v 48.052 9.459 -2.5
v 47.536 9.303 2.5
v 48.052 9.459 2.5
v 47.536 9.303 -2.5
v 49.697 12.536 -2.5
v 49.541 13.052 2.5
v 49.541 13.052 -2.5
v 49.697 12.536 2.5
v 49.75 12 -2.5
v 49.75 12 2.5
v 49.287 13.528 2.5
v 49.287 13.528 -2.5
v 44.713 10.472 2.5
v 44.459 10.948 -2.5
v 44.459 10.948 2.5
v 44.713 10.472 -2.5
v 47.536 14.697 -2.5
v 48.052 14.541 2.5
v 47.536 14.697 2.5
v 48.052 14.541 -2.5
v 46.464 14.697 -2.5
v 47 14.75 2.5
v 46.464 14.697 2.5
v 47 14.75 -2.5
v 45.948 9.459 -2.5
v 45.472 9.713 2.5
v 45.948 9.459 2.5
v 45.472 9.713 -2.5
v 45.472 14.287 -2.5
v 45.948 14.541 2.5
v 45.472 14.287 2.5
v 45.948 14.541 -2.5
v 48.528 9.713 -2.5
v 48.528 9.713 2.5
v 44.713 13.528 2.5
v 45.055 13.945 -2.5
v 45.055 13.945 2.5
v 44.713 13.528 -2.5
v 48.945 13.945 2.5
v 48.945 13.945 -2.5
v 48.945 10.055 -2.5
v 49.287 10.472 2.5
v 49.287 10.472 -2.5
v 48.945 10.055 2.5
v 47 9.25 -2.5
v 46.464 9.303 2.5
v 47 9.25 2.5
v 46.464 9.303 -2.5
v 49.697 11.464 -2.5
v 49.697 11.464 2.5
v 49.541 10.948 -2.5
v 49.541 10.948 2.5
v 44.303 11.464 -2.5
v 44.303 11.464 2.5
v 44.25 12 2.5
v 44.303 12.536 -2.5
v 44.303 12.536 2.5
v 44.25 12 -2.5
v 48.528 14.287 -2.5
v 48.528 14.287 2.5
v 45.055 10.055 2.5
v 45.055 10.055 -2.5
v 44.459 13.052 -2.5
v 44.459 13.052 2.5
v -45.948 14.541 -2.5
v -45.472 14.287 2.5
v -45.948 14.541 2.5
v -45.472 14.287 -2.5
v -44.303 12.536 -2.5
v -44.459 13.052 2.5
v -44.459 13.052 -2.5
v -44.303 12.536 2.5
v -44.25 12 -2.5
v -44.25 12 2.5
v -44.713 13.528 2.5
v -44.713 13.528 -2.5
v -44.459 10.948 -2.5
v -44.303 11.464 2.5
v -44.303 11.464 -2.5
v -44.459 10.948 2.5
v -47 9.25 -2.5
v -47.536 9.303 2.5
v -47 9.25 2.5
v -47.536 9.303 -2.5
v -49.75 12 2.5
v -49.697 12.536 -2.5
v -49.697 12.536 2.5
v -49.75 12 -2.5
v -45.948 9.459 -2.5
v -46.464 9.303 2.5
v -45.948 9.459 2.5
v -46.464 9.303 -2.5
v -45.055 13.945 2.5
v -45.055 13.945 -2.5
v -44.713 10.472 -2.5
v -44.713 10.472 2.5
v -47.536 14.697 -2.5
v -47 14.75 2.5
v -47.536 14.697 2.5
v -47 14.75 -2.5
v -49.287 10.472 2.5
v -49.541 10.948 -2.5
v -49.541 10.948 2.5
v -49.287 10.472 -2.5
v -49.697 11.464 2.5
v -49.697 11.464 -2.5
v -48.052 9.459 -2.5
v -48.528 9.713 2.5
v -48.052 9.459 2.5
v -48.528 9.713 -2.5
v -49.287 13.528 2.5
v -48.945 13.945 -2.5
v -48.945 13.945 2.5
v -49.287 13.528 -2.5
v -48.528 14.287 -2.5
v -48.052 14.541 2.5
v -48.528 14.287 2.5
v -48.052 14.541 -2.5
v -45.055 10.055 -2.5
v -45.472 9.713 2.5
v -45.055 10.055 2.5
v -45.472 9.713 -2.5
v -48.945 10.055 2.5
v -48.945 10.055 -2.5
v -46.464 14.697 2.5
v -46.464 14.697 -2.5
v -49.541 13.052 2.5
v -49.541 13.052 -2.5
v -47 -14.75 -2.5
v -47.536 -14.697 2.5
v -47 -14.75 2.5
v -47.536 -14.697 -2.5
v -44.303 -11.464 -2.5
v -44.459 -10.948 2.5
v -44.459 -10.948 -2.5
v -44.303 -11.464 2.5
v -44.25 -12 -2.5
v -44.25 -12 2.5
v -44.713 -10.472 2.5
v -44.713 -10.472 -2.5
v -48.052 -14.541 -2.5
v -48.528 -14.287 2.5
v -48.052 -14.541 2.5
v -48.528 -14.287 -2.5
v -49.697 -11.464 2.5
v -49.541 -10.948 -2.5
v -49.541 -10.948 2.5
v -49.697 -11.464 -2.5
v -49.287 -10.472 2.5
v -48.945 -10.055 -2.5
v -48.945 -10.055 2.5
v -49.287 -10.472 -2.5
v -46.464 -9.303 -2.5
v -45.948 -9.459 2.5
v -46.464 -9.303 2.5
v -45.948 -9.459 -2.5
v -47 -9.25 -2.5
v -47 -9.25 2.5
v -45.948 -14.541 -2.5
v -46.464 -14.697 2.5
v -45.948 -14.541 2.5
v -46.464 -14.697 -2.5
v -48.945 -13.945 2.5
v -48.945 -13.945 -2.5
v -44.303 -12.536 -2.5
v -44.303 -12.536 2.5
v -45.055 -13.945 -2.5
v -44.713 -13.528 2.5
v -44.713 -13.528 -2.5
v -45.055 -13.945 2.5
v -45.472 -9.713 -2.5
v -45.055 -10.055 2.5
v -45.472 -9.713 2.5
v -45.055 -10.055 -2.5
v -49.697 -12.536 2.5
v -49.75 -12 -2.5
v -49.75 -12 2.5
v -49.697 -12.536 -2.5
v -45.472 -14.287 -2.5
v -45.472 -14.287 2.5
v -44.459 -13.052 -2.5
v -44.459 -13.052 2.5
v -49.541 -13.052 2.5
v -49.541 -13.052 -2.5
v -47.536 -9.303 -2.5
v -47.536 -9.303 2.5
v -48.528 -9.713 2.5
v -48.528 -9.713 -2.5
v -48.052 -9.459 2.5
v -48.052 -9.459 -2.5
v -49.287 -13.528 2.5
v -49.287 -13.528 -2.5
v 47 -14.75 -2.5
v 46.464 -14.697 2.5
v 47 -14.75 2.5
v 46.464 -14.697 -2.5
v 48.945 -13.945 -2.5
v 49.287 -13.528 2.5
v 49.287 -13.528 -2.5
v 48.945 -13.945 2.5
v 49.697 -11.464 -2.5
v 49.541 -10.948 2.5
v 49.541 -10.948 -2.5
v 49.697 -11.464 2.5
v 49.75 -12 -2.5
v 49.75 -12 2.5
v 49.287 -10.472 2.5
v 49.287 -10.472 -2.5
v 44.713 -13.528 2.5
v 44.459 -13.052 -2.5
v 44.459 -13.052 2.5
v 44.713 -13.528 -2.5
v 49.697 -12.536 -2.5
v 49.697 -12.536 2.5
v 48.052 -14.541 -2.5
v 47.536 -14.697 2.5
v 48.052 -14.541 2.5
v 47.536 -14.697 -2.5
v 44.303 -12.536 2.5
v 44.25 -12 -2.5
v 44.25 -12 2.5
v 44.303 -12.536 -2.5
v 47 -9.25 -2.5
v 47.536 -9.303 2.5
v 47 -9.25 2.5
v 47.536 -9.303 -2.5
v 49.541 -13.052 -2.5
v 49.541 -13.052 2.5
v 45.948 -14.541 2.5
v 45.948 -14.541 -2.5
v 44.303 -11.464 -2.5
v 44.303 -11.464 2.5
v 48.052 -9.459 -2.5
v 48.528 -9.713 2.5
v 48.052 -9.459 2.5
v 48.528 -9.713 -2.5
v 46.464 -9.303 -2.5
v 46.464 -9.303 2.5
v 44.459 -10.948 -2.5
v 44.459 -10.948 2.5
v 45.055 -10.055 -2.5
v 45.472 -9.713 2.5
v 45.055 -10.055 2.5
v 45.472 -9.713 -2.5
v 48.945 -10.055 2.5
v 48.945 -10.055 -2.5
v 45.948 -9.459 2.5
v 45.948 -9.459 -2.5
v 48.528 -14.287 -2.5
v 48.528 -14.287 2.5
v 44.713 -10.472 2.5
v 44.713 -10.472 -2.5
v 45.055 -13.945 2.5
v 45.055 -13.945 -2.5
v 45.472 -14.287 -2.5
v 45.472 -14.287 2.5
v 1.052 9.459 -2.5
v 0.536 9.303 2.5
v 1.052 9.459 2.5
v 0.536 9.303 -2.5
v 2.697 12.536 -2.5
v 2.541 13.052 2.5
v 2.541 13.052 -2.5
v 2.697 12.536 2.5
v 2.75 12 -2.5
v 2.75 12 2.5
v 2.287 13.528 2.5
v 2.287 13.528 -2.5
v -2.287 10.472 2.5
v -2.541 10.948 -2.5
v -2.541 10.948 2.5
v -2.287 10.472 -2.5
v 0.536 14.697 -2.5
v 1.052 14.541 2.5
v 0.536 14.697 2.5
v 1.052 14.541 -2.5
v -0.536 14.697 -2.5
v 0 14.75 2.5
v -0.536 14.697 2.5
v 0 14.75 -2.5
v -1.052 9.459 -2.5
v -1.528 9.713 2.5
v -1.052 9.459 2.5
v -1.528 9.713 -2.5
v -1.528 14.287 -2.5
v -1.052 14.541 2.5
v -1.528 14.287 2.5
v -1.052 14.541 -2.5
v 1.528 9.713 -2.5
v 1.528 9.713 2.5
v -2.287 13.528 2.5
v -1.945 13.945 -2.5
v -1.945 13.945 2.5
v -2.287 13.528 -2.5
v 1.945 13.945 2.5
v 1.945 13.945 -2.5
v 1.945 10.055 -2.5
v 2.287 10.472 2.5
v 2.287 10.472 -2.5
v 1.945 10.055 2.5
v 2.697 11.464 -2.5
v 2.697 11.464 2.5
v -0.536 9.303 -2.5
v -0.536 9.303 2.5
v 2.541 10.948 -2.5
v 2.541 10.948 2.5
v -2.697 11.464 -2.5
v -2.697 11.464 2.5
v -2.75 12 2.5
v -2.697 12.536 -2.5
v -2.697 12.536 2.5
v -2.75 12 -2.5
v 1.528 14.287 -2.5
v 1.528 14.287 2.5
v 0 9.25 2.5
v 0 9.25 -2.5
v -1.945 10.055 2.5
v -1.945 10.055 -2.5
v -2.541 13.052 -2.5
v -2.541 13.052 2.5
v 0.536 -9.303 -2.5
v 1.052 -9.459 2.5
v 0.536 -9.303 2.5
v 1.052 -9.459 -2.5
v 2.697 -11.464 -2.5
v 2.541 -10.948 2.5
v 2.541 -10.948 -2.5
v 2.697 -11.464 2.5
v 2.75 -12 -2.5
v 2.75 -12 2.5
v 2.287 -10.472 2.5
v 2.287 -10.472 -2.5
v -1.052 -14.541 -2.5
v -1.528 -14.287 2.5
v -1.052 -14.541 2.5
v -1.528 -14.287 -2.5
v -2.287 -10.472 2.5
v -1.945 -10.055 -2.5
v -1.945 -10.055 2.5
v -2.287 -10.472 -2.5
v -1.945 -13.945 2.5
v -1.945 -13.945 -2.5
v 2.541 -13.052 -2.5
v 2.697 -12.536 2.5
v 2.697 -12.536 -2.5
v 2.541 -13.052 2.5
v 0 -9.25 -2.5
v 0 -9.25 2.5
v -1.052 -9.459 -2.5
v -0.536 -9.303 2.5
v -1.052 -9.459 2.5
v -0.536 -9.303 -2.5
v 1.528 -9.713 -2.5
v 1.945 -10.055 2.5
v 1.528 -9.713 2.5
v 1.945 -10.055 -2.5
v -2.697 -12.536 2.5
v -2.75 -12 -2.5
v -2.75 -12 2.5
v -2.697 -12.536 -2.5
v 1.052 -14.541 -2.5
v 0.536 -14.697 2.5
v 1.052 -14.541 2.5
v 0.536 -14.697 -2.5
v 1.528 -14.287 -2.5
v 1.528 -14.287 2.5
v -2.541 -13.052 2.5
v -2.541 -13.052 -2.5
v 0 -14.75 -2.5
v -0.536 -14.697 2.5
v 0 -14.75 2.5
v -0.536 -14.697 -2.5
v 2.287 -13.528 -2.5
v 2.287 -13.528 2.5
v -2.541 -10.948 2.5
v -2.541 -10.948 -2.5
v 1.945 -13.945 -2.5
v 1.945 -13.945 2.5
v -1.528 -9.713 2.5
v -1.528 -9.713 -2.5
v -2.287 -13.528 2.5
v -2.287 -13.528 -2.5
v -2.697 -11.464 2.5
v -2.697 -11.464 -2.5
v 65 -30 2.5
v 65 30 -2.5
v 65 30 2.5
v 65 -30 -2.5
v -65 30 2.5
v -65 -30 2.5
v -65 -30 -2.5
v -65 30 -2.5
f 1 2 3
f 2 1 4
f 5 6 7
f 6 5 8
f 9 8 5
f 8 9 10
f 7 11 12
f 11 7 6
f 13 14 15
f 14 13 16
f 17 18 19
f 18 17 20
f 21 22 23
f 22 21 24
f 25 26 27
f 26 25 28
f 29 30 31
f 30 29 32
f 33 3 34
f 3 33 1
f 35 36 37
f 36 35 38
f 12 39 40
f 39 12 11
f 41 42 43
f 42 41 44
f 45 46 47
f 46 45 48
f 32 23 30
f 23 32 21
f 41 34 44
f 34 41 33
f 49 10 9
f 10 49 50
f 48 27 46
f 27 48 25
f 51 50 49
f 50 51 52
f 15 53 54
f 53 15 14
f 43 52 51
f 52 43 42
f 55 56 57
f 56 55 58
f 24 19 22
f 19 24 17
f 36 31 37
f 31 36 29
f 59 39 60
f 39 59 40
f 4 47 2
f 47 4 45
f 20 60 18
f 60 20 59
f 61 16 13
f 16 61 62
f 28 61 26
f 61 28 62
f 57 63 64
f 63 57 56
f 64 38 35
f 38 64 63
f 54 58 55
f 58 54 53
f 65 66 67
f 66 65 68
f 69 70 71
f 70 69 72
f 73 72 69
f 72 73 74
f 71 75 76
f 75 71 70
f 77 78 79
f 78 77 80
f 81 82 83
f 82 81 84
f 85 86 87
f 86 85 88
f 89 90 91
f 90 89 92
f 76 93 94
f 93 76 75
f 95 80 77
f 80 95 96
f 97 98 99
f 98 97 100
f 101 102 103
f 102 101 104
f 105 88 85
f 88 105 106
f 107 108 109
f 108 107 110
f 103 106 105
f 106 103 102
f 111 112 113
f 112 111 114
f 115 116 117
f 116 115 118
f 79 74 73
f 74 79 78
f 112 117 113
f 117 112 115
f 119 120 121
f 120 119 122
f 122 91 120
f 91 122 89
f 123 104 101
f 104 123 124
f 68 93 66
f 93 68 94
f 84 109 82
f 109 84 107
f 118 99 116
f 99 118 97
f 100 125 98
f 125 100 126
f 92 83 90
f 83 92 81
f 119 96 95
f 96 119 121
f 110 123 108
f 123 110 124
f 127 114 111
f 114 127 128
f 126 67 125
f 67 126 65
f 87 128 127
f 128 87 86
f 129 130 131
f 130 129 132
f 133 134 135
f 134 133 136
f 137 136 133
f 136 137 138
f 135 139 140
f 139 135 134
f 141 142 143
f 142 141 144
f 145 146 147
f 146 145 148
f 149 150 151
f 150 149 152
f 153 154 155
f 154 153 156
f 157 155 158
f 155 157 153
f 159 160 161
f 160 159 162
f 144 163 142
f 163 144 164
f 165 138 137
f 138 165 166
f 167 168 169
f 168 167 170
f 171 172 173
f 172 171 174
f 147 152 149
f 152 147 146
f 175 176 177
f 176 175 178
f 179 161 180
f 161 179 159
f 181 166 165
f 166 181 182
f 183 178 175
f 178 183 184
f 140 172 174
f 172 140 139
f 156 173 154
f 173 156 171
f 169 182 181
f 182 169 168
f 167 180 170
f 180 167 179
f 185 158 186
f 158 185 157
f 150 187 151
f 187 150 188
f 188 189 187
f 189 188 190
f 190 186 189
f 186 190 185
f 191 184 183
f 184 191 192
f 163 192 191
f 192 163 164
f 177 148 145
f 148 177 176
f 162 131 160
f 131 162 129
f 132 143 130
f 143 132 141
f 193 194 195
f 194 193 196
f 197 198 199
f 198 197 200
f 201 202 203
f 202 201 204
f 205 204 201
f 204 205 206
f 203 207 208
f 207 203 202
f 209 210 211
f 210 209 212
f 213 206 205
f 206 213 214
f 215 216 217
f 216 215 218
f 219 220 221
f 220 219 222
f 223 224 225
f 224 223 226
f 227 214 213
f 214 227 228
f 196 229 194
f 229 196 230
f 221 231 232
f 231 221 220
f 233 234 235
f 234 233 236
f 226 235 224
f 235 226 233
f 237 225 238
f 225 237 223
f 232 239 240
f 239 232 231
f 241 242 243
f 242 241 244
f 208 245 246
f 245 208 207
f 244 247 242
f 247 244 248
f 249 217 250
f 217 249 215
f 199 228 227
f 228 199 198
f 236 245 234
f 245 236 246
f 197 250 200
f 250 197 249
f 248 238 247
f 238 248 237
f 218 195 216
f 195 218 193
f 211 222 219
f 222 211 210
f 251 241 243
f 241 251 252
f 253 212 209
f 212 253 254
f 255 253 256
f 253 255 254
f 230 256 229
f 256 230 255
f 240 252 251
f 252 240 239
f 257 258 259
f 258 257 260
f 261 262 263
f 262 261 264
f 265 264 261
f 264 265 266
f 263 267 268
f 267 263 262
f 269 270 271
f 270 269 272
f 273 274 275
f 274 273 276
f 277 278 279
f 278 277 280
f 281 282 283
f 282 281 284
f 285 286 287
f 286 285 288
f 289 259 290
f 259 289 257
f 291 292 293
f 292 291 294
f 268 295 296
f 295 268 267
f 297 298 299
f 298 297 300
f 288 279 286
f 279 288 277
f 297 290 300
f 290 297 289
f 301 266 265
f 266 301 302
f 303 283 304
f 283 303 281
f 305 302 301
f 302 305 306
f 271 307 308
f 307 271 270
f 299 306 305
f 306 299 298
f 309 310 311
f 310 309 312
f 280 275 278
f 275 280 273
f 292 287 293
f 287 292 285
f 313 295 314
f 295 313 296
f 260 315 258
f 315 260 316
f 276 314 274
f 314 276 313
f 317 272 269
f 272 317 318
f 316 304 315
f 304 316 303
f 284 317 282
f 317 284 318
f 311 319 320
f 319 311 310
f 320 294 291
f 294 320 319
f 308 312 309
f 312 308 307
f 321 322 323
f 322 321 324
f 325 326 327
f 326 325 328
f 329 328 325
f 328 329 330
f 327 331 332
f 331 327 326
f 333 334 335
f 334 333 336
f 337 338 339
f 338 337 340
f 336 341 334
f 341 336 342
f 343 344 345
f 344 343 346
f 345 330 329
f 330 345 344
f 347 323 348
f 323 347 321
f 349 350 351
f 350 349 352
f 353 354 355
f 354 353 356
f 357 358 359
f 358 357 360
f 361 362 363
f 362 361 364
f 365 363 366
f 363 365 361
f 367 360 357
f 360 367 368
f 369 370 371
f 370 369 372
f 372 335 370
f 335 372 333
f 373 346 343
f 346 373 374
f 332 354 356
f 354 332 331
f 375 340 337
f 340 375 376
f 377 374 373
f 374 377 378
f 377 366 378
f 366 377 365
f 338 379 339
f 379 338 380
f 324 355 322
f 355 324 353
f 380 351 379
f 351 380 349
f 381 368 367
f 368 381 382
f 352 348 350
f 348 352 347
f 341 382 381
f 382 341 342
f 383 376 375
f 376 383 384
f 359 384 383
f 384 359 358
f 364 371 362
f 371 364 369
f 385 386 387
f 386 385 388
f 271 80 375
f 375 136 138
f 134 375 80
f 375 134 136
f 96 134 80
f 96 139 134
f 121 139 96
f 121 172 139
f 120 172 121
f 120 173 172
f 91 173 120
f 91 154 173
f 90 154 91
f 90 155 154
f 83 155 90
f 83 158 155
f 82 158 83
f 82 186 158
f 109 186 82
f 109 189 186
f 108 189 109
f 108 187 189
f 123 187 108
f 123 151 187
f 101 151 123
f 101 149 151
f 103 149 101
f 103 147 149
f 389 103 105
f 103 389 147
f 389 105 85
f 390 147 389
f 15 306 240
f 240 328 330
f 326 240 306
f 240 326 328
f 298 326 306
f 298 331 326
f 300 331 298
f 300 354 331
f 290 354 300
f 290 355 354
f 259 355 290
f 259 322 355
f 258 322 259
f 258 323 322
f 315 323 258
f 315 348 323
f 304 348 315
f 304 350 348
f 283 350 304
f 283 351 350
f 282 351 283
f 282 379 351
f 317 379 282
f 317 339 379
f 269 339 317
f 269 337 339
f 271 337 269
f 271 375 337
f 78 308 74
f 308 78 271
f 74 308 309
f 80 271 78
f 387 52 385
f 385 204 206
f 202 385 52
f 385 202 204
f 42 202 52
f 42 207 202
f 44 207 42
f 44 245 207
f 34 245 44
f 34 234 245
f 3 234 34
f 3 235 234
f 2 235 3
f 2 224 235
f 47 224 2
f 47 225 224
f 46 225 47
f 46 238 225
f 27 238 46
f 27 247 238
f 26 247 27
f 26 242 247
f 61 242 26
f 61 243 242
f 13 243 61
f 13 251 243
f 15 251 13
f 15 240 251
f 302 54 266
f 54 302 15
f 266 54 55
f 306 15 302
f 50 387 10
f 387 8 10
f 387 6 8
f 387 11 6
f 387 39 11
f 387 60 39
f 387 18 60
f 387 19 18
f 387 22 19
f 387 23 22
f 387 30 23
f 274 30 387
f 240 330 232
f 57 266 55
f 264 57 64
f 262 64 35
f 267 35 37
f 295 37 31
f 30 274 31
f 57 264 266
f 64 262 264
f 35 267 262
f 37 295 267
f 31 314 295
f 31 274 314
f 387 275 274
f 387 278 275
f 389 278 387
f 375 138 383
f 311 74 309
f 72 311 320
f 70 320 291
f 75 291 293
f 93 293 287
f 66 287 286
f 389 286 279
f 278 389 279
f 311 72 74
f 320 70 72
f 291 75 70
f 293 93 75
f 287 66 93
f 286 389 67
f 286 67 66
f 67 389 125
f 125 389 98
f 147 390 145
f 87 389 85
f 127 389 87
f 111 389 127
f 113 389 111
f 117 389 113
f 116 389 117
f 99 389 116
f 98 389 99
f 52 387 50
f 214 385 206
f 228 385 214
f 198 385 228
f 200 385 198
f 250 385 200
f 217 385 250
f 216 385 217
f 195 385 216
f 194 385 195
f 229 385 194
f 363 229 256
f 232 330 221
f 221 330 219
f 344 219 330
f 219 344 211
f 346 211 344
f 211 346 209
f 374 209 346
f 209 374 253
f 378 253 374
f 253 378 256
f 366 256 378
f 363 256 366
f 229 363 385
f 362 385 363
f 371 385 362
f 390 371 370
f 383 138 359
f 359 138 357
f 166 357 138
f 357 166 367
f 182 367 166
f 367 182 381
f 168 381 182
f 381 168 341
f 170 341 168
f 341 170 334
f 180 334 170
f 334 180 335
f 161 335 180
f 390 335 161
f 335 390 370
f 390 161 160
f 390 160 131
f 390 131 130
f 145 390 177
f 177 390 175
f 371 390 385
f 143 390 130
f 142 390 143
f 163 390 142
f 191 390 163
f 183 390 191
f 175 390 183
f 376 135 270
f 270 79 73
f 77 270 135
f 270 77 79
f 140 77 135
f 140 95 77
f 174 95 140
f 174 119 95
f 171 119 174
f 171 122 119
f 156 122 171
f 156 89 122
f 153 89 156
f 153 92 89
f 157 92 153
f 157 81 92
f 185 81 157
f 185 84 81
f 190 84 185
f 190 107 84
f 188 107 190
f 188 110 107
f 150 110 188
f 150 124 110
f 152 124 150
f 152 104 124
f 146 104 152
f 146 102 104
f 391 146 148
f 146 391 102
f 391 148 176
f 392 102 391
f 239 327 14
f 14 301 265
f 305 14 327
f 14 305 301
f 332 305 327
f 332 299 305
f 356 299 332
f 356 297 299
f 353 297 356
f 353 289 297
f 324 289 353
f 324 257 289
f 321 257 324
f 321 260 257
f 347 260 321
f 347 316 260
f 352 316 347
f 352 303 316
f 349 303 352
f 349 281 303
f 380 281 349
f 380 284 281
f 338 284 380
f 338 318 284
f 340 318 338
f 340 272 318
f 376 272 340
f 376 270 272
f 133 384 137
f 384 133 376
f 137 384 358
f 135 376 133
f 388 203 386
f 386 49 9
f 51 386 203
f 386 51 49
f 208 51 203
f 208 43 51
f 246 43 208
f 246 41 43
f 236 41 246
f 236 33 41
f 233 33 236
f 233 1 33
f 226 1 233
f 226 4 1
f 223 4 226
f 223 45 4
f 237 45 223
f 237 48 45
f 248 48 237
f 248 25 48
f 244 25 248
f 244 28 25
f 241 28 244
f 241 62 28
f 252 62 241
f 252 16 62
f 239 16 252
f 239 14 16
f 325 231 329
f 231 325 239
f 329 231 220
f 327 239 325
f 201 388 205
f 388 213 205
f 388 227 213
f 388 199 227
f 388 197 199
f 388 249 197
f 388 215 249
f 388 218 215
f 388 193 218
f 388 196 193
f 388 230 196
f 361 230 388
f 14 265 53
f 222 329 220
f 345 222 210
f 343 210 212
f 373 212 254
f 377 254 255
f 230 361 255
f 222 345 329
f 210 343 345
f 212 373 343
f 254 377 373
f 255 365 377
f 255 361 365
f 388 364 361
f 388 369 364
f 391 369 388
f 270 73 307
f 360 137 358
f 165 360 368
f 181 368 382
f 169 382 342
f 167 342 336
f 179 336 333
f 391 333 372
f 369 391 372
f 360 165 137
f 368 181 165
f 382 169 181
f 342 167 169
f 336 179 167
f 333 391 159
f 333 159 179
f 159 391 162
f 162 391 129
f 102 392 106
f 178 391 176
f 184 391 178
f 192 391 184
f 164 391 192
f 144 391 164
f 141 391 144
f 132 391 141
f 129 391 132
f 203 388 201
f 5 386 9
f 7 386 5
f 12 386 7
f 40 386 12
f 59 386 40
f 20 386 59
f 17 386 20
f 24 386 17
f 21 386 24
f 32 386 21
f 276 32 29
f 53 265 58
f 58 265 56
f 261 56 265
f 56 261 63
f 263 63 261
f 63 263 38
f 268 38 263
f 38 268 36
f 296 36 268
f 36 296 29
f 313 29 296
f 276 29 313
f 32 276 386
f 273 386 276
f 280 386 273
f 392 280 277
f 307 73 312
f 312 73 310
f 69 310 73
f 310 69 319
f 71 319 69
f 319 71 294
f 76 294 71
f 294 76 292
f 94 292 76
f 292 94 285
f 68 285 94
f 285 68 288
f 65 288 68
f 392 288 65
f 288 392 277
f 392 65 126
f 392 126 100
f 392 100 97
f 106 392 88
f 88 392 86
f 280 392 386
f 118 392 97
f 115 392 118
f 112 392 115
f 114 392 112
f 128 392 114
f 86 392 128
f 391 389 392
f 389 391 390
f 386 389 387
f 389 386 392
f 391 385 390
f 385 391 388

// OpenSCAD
$fn = 32;

// ----------------------------------------------------------------------
// Corner plate 130 x 60 x 5
// 6 holes, centres taken from the edge offset
// ----------------------------------------------------------------------

// --- parameters (mm) ---
plate = [130, 60, 5];  // overall size (x, y, z)
seat_tol = 0.1;        // tolerance at the seating features
free_tol = 0.5;        // general tolerance on the free sizes
holes = 6;             // number of holes the drawing asks for
hole_d = 5.5;          // hole diameter
edge = 18;             // hole centre offset from the plate edge

// --- derived feature positions (mm) ---
corner_x = plate[0] / 2 - edge;  // = 47   corner hole X
corner_y = plate[1] / 2 - edge;  // = 12   corner hole Y
feature_centers = [
  [corner_x, corner_y],
  [-corner_x, corner_y],
  [-corner_x, -corner_y],
  [corner_x, -corner_y],
  [0, corner_y],
  [0, -corner_y]
];   // hole centres the loop below drills

// plate outline, every hole drilled through with the same cutters
difference() {
  cube(plate, center = true);
  for (centre = feature_centers)
    translate([centre[0], centre[1], 0])
      cylinder(d = hole_d, h = plate[2] + 2, center = true);
}
